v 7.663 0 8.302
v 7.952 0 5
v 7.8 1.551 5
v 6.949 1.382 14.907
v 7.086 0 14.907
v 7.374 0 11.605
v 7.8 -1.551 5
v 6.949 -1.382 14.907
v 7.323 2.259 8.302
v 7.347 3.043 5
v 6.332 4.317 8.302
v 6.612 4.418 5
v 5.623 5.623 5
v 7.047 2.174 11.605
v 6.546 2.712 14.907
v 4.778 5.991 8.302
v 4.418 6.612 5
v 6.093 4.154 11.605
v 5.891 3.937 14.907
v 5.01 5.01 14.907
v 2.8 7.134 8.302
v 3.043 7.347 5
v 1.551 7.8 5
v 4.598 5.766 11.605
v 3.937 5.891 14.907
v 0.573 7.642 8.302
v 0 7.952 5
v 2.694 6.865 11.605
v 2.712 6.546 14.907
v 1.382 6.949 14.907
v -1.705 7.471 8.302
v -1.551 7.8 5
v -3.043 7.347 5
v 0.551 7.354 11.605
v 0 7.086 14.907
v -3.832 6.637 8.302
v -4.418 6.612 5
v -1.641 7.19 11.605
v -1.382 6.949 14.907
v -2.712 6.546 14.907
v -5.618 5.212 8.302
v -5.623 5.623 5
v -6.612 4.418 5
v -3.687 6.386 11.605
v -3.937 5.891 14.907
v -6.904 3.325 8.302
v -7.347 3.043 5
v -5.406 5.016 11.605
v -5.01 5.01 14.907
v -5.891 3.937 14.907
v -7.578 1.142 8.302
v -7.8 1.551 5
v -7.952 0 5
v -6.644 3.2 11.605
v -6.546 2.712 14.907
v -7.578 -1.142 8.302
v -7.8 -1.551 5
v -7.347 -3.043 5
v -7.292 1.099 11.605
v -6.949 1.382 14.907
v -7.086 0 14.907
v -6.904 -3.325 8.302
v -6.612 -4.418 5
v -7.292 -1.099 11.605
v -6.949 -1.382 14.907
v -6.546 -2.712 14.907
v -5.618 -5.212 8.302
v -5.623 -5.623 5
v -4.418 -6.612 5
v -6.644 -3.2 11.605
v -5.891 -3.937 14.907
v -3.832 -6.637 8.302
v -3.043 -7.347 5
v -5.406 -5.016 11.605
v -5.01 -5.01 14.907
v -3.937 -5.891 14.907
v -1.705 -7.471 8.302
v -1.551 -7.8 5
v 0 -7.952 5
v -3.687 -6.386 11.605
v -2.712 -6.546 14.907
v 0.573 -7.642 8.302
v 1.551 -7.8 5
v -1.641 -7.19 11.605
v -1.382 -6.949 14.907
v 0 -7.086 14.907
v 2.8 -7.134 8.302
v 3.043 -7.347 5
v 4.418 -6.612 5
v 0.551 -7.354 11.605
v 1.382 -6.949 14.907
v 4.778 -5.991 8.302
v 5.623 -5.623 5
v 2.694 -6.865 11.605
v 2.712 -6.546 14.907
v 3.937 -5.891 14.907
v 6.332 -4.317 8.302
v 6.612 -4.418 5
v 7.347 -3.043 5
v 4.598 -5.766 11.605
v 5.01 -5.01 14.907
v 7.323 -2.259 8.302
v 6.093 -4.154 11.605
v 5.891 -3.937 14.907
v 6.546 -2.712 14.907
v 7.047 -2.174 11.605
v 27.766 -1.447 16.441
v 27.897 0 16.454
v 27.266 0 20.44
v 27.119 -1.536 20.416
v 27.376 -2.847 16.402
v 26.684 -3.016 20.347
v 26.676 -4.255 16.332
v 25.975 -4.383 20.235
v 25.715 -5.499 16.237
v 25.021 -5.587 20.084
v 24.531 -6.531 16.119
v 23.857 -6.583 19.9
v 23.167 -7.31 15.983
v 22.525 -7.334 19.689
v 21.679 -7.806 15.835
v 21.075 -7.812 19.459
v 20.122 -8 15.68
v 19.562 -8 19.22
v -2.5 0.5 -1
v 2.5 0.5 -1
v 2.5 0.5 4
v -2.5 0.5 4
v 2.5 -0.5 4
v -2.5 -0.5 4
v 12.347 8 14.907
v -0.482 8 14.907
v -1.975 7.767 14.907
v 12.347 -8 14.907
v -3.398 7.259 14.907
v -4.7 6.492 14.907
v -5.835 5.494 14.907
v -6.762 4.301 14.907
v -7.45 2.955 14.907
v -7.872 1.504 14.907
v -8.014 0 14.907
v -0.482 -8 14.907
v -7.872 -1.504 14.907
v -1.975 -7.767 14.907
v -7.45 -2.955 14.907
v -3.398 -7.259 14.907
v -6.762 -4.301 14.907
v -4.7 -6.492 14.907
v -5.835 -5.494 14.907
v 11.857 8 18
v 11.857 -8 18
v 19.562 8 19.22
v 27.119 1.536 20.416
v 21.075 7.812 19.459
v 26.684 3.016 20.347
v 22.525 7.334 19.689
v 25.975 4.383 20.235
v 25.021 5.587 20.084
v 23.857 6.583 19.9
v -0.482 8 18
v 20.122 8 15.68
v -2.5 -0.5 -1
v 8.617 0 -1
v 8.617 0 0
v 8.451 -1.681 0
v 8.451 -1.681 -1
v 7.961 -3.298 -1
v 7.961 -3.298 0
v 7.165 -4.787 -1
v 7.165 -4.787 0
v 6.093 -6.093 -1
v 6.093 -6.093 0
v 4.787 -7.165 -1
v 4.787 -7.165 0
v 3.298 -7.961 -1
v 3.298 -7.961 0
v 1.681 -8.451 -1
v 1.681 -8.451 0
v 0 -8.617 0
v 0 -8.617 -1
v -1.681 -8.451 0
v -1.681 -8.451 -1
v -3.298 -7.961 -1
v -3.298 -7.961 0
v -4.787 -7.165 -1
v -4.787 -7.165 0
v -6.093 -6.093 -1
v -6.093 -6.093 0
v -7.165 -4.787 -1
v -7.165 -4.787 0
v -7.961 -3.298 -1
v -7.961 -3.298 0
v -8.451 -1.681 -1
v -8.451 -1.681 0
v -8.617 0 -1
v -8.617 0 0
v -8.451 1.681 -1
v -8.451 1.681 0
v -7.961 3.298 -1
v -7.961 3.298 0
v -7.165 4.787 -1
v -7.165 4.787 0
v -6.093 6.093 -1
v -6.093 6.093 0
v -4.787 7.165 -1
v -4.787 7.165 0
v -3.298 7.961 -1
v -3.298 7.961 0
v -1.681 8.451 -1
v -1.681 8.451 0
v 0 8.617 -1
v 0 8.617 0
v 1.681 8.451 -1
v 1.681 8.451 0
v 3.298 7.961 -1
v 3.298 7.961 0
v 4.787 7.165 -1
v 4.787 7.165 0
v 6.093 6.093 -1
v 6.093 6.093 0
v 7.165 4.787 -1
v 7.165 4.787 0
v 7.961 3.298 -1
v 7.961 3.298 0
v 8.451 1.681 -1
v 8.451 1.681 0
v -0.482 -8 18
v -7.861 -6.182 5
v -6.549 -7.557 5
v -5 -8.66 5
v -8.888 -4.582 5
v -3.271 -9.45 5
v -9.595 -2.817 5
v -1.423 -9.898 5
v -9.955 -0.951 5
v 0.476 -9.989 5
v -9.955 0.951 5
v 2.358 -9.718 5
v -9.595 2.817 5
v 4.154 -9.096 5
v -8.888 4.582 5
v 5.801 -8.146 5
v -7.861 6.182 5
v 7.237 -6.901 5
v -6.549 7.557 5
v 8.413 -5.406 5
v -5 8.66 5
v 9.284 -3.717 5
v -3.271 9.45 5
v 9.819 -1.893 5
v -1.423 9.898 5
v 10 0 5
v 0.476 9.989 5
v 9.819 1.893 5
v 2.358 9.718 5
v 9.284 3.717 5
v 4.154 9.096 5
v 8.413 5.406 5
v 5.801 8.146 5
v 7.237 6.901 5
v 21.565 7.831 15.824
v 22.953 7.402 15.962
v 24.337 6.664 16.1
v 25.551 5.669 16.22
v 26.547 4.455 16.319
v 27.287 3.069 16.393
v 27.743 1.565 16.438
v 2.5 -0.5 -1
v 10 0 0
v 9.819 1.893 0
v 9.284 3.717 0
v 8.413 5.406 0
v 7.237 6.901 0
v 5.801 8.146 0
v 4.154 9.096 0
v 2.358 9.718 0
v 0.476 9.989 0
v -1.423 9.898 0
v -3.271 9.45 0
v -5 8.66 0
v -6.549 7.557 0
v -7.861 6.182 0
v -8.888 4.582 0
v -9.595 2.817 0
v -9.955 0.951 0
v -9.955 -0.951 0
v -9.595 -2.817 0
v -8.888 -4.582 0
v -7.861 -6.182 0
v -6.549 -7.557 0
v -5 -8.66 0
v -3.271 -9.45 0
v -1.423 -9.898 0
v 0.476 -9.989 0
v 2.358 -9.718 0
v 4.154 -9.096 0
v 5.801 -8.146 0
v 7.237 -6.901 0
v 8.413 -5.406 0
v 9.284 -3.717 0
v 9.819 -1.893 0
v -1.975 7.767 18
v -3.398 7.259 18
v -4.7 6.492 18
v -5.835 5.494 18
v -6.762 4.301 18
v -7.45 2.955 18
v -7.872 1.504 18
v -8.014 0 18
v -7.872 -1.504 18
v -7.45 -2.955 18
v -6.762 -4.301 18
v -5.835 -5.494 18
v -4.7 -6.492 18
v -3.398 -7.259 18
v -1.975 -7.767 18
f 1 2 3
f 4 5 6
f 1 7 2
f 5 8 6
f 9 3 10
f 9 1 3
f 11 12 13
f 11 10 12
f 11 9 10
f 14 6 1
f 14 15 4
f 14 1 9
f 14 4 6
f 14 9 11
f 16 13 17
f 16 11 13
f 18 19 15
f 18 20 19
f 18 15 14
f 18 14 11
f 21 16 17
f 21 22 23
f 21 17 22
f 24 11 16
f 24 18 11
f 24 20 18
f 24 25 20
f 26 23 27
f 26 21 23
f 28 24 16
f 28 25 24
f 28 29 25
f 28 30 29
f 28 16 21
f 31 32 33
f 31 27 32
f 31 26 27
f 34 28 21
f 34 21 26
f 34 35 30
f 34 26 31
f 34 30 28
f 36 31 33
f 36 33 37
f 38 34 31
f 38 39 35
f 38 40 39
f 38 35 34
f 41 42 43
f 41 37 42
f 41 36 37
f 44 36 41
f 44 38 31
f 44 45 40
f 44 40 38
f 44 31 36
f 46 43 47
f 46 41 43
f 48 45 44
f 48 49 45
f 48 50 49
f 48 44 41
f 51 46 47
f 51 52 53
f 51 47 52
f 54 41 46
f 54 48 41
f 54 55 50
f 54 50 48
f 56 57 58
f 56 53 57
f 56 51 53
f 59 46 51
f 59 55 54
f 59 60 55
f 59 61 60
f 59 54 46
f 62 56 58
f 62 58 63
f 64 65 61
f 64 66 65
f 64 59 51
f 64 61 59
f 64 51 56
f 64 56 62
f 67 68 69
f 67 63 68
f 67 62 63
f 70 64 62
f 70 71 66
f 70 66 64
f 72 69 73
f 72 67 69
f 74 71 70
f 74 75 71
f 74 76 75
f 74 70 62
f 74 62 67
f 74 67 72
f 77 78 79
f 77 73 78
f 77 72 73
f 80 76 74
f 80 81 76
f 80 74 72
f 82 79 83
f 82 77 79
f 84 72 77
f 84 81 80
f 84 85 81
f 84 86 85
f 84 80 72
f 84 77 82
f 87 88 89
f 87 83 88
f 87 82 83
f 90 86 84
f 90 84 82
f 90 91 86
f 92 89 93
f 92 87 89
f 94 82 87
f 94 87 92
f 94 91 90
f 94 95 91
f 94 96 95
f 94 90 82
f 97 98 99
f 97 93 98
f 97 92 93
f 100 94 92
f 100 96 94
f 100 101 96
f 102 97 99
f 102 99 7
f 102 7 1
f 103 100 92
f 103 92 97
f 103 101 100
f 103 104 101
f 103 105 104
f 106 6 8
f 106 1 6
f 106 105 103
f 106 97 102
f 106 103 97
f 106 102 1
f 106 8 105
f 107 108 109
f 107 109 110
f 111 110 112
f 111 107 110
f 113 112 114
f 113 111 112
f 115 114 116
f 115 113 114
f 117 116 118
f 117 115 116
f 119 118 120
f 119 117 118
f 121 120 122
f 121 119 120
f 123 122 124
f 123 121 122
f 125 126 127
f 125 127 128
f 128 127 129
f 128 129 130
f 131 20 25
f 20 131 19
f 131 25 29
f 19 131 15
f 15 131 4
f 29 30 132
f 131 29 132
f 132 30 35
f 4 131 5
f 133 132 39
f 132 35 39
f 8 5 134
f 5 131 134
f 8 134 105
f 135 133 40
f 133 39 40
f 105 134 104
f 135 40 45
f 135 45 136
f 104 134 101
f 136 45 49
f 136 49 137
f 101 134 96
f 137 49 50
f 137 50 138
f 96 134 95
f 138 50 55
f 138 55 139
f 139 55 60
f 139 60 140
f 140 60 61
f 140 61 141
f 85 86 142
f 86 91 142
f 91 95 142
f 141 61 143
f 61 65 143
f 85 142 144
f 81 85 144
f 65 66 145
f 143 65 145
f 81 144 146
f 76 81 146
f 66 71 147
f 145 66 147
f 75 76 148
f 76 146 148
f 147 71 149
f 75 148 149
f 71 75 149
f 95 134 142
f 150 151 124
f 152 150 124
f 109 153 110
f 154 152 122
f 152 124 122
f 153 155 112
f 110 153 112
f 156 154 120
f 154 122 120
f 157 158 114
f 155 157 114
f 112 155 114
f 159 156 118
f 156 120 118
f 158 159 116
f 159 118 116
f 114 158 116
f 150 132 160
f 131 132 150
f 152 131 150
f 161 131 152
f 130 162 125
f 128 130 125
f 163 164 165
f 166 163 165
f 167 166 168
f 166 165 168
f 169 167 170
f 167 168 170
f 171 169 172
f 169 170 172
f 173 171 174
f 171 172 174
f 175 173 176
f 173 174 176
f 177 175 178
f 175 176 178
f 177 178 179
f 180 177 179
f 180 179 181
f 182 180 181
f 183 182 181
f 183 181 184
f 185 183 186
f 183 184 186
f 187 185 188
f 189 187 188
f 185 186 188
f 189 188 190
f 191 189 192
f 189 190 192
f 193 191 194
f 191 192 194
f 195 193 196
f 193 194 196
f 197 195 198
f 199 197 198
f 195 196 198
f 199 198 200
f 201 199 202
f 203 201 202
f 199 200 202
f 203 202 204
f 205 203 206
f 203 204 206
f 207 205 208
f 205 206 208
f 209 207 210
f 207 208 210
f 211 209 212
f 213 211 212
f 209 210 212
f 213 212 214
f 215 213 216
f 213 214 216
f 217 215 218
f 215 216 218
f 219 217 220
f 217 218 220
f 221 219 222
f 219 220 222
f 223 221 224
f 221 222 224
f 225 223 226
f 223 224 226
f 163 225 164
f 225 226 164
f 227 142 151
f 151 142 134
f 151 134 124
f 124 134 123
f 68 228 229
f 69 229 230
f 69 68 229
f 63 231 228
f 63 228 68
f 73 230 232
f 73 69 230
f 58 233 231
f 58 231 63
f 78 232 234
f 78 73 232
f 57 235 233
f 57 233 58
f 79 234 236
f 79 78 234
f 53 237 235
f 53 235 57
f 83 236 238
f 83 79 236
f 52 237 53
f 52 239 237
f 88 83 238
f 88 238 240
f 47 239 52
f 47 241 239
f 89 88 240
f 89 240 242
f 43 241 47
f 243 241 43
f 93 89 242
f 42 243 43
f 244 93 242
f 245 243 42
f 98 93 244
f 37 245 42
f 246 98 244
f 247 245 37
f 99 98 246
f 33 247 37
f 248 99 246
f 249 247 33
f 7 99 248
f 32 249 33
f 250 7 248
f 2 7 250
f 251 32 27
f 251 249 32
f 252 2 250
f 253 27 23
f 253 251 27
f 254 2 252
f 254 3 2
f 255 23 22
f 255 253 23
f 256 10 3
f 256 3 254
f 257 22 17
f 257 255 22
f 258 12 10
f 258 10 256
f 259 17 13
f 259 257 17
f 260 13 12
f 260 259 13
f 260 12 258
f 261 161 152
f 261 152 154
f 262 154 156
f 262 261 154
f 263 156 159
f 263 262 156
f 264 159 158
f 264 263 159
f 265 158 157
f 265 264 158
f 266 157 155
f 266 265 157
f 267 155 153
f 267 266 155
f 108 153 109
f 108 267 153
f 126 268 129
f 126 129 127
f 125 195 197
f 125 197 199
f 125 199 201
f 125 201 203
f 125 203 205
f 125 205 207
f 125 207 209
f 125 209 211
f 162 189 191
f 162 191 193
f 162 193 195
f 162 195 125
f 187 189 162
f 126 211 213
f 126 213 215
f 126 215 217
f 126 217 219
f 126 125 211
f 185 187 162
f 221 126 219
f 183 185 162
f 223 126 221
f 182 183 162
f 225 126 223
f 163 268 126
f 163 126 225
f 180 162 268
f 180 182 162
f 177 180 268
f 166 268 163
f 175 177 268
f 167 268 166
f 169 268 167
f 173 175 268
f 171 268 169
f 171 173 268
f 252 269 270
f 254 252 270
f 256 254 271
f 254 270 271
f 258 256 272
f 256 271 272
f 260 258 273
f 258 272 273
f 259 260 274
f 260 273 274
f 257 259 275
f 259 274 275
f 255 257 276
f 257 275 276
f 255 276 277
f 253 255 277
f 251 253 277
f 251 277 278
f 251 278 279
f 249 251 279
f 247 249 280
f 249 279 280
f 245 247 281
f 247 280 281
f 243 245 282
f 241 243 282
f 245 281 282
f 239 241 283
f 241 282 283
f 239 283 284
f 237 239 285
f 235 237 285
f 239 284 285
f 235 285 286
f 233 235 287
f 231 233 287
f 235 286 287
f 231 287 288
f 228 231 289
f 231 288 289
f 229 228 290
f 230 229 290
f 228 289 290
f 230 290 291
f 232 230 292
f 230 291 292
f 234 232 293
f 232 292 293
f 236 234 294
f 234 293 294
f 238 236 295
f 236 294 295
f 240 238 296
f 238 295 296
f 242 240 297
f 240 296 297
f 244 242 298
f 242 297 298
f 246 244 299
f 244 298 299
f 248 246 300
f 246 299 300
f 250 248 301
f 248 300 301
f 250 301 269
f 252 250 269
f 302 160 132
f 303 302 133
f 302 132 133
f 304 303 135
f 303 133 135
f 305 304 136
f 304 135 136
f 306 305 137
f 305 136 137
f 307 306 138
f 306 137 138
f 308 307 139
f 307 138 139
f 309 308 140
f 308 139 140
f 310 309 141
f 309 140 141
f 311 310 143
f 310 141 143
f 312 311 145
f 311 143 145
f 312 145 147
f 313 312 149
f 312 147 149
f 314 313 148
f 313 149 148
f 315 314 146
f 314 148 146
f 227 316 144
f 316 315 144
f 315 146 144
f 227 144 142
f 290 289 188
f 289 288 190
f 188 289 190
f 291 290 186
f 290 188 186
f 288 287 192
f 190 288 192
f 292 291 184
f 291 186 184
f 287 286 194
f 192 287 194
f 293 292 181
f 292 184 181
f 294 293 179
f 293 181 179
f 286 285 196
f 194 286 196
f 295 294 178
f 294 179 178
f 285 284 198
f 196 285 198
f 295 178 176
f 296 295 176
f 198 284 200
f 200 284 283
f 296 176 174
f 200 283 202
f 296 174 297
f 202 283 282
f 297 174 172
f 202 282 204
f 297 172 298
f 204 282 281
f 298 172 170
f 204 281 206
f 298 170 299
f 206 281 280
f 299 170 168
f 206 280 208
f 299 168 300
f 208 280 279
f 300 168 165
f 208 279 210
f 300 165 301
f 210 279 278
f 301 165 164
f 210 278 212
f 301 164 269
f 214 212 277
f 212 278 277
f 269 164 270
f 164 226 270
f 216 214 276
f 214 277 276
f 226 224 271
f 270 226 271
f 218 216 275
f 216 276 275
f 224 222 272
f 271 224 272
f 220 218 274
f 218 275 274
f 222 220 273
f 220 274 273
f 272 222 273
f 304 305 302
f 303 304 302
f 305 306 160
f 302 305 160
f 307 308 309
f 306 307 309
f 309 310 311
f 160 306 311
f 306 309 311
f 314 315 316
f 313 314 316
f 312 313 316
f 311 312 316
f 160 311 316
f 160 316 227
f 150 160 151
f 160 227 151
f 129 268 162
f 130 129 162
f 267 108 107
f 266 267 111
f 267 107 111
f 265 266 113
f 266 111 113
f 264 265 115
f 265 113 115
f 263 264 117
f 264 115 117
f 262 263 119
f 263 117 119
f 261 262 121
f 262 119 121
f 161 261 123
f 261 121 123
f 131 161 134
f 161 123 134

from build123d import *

# Parameters (mm, degrees)
SKETCH_1_R               = 10
EXTRUDE_1_DEPTH          = 5
SKETCH_2_R               = 7.952304339
EXTRUDE_2_DEPTH          = 10
EXTRUDE_2_TAPER          = 5
EXTRUDE_3_DEPTH          = 8
EXTRUDE_3_DEPTH_BACK     = 8
CUT_EXTRUDE_3_DEPTH      = 34.173609497
CUT_EXTRUDE_4_DEPTH      = 36.648067297
CUT_EXTRUDE_4_DEPTH_BACK = 36.648067297
SKETCH_12_R              = 8.616944053
EXTRUDE_4_DEPTH          = 1
SKETCH_13_W              = 5
SKETCH_13_H              = 1
CUT_EXTRUDE_5_DEPTH      = 5


with BuildPart() as part:
    # 草图1 → 拉伸1 (new body)
    with BuildSketch(Plane.XY):
        Circle(SKETCH_1_R)
    extrude(amount=EXTRUDE_1_DEPTH)

    # 草图2 → 拉伸2 (add)
    with BuildSketch(Plane.XY.offset(5)):
        Circle(SKETCH_2_R)
    extrude(amount=EXTRUDE_2_DEPTH, taper=EXTRUDE_2_TAPER)

    # 草图6 → 拉伸3 (add, two sides: drawn at the far end of the back side and taken through both)
    with BuildSketch(Plane(origin=(0, 0, 0), x_dir=(1, 0, 0), z_dir=(0, 1, 0)).offset(-EXTRUDE_3_DEPTH_BACK)):
        Polygon((0, -14.907325308), (-8.038553131, -14.907325308), (-8.038553131, -18), (11.857379423, -18), (27.26622564, -20.43963433), (27.897312043, -16.453662654), (12.347032914, -14.907325308), align=None)
    extrude(amount=EXTRUDE_3_DEPTH + EXTRUDE_3_DEPTH_BACK)

    # 草图10 → 切除-拉伸3 (cut, through all)
    with BuildSketch(Plane(origin=(0, 0, 14.907325308), x_dir=(-1, 0, 0), z_dir=(0, 0, -1))):
        with BuildLine():
            Line((8.038553131, 8), (0.481598082, 8))
            ThreePointArc((0.481598082, 8), (8.014482935, 0), (0.481598082, -8))
            Line((0.481598082, -8), (8.038553131, -8))
            Line((8.038553131, -8), (8.038553131, 8))
        make_face()
    extrude(amount=-CUT_EXTRUDE_3_DEPTH, mode=Mode.SUBTRACT)

    # 草图11 → 切除-拉伸4 (cut, two sides: drawn at the far end of the back side and taken through both)
    with BuildSketch(Plane(origin=(-2.490226462, 0, 15.728388526), x_dir=(0.9876971253210124, 0, 0.15637899038108757), z_dir=(-0.15637899038108757, 0, 0.9876971253210124)).offset(-CUT_EXTRUDE_4_DEPTH_BACK)):
        with BuildLine():
            Line((30.127102063, 8), (22.32671173, 8))
            ThreePointArc((22.32671173, 8), (27.854238113, 5.586727337), (30.127102063, 0))
            Line((30.127102063, 0), (30.127102063, 8))
        make_face()
        with BuildLine():
            Line((30.127102063, -8), (30.127102063, 0))
            ThreePointArc((30.127102063, 0), (27.854238113, -5.586727337), (22.32671173, -8))
            Line((22.32671173, -8), (30.127102063, -8))
        make_face()
    extrude(amount=CUT_EXTRUDE_4_DEPTH + CUT_EXTRUDE_4_DEPTH_BACK, mode=Mode.SUBTRACT)

    # 草图12 → 拉伸4 (add)
    with BuildSketch(Plane(origin=(0, 0, 0), x_dir=(-1, 0, 0), z_dir=(0, 0, -1))):
        with Locations(Location((0, 0, 0), (0, 0, 180))):
            Circle(SKETCH_12_R)
    extrude(amount=EXTRUDE_4_DEPTH)

    # 草图13 → 切除-拉伸5 (cut)
    with BuildSketch(Plane(origin=(0, 0, -1), x_dir=(-1, 0, 0), z_dir=(0, 0, -1))):
        Rectangle(SKETCH_13_W, SKETCH_13_H)
    extrude(amount=-CUT_EXTRUDE_5_DEPTH, mode=Mode.SUBTRACT)


solid = part.part
